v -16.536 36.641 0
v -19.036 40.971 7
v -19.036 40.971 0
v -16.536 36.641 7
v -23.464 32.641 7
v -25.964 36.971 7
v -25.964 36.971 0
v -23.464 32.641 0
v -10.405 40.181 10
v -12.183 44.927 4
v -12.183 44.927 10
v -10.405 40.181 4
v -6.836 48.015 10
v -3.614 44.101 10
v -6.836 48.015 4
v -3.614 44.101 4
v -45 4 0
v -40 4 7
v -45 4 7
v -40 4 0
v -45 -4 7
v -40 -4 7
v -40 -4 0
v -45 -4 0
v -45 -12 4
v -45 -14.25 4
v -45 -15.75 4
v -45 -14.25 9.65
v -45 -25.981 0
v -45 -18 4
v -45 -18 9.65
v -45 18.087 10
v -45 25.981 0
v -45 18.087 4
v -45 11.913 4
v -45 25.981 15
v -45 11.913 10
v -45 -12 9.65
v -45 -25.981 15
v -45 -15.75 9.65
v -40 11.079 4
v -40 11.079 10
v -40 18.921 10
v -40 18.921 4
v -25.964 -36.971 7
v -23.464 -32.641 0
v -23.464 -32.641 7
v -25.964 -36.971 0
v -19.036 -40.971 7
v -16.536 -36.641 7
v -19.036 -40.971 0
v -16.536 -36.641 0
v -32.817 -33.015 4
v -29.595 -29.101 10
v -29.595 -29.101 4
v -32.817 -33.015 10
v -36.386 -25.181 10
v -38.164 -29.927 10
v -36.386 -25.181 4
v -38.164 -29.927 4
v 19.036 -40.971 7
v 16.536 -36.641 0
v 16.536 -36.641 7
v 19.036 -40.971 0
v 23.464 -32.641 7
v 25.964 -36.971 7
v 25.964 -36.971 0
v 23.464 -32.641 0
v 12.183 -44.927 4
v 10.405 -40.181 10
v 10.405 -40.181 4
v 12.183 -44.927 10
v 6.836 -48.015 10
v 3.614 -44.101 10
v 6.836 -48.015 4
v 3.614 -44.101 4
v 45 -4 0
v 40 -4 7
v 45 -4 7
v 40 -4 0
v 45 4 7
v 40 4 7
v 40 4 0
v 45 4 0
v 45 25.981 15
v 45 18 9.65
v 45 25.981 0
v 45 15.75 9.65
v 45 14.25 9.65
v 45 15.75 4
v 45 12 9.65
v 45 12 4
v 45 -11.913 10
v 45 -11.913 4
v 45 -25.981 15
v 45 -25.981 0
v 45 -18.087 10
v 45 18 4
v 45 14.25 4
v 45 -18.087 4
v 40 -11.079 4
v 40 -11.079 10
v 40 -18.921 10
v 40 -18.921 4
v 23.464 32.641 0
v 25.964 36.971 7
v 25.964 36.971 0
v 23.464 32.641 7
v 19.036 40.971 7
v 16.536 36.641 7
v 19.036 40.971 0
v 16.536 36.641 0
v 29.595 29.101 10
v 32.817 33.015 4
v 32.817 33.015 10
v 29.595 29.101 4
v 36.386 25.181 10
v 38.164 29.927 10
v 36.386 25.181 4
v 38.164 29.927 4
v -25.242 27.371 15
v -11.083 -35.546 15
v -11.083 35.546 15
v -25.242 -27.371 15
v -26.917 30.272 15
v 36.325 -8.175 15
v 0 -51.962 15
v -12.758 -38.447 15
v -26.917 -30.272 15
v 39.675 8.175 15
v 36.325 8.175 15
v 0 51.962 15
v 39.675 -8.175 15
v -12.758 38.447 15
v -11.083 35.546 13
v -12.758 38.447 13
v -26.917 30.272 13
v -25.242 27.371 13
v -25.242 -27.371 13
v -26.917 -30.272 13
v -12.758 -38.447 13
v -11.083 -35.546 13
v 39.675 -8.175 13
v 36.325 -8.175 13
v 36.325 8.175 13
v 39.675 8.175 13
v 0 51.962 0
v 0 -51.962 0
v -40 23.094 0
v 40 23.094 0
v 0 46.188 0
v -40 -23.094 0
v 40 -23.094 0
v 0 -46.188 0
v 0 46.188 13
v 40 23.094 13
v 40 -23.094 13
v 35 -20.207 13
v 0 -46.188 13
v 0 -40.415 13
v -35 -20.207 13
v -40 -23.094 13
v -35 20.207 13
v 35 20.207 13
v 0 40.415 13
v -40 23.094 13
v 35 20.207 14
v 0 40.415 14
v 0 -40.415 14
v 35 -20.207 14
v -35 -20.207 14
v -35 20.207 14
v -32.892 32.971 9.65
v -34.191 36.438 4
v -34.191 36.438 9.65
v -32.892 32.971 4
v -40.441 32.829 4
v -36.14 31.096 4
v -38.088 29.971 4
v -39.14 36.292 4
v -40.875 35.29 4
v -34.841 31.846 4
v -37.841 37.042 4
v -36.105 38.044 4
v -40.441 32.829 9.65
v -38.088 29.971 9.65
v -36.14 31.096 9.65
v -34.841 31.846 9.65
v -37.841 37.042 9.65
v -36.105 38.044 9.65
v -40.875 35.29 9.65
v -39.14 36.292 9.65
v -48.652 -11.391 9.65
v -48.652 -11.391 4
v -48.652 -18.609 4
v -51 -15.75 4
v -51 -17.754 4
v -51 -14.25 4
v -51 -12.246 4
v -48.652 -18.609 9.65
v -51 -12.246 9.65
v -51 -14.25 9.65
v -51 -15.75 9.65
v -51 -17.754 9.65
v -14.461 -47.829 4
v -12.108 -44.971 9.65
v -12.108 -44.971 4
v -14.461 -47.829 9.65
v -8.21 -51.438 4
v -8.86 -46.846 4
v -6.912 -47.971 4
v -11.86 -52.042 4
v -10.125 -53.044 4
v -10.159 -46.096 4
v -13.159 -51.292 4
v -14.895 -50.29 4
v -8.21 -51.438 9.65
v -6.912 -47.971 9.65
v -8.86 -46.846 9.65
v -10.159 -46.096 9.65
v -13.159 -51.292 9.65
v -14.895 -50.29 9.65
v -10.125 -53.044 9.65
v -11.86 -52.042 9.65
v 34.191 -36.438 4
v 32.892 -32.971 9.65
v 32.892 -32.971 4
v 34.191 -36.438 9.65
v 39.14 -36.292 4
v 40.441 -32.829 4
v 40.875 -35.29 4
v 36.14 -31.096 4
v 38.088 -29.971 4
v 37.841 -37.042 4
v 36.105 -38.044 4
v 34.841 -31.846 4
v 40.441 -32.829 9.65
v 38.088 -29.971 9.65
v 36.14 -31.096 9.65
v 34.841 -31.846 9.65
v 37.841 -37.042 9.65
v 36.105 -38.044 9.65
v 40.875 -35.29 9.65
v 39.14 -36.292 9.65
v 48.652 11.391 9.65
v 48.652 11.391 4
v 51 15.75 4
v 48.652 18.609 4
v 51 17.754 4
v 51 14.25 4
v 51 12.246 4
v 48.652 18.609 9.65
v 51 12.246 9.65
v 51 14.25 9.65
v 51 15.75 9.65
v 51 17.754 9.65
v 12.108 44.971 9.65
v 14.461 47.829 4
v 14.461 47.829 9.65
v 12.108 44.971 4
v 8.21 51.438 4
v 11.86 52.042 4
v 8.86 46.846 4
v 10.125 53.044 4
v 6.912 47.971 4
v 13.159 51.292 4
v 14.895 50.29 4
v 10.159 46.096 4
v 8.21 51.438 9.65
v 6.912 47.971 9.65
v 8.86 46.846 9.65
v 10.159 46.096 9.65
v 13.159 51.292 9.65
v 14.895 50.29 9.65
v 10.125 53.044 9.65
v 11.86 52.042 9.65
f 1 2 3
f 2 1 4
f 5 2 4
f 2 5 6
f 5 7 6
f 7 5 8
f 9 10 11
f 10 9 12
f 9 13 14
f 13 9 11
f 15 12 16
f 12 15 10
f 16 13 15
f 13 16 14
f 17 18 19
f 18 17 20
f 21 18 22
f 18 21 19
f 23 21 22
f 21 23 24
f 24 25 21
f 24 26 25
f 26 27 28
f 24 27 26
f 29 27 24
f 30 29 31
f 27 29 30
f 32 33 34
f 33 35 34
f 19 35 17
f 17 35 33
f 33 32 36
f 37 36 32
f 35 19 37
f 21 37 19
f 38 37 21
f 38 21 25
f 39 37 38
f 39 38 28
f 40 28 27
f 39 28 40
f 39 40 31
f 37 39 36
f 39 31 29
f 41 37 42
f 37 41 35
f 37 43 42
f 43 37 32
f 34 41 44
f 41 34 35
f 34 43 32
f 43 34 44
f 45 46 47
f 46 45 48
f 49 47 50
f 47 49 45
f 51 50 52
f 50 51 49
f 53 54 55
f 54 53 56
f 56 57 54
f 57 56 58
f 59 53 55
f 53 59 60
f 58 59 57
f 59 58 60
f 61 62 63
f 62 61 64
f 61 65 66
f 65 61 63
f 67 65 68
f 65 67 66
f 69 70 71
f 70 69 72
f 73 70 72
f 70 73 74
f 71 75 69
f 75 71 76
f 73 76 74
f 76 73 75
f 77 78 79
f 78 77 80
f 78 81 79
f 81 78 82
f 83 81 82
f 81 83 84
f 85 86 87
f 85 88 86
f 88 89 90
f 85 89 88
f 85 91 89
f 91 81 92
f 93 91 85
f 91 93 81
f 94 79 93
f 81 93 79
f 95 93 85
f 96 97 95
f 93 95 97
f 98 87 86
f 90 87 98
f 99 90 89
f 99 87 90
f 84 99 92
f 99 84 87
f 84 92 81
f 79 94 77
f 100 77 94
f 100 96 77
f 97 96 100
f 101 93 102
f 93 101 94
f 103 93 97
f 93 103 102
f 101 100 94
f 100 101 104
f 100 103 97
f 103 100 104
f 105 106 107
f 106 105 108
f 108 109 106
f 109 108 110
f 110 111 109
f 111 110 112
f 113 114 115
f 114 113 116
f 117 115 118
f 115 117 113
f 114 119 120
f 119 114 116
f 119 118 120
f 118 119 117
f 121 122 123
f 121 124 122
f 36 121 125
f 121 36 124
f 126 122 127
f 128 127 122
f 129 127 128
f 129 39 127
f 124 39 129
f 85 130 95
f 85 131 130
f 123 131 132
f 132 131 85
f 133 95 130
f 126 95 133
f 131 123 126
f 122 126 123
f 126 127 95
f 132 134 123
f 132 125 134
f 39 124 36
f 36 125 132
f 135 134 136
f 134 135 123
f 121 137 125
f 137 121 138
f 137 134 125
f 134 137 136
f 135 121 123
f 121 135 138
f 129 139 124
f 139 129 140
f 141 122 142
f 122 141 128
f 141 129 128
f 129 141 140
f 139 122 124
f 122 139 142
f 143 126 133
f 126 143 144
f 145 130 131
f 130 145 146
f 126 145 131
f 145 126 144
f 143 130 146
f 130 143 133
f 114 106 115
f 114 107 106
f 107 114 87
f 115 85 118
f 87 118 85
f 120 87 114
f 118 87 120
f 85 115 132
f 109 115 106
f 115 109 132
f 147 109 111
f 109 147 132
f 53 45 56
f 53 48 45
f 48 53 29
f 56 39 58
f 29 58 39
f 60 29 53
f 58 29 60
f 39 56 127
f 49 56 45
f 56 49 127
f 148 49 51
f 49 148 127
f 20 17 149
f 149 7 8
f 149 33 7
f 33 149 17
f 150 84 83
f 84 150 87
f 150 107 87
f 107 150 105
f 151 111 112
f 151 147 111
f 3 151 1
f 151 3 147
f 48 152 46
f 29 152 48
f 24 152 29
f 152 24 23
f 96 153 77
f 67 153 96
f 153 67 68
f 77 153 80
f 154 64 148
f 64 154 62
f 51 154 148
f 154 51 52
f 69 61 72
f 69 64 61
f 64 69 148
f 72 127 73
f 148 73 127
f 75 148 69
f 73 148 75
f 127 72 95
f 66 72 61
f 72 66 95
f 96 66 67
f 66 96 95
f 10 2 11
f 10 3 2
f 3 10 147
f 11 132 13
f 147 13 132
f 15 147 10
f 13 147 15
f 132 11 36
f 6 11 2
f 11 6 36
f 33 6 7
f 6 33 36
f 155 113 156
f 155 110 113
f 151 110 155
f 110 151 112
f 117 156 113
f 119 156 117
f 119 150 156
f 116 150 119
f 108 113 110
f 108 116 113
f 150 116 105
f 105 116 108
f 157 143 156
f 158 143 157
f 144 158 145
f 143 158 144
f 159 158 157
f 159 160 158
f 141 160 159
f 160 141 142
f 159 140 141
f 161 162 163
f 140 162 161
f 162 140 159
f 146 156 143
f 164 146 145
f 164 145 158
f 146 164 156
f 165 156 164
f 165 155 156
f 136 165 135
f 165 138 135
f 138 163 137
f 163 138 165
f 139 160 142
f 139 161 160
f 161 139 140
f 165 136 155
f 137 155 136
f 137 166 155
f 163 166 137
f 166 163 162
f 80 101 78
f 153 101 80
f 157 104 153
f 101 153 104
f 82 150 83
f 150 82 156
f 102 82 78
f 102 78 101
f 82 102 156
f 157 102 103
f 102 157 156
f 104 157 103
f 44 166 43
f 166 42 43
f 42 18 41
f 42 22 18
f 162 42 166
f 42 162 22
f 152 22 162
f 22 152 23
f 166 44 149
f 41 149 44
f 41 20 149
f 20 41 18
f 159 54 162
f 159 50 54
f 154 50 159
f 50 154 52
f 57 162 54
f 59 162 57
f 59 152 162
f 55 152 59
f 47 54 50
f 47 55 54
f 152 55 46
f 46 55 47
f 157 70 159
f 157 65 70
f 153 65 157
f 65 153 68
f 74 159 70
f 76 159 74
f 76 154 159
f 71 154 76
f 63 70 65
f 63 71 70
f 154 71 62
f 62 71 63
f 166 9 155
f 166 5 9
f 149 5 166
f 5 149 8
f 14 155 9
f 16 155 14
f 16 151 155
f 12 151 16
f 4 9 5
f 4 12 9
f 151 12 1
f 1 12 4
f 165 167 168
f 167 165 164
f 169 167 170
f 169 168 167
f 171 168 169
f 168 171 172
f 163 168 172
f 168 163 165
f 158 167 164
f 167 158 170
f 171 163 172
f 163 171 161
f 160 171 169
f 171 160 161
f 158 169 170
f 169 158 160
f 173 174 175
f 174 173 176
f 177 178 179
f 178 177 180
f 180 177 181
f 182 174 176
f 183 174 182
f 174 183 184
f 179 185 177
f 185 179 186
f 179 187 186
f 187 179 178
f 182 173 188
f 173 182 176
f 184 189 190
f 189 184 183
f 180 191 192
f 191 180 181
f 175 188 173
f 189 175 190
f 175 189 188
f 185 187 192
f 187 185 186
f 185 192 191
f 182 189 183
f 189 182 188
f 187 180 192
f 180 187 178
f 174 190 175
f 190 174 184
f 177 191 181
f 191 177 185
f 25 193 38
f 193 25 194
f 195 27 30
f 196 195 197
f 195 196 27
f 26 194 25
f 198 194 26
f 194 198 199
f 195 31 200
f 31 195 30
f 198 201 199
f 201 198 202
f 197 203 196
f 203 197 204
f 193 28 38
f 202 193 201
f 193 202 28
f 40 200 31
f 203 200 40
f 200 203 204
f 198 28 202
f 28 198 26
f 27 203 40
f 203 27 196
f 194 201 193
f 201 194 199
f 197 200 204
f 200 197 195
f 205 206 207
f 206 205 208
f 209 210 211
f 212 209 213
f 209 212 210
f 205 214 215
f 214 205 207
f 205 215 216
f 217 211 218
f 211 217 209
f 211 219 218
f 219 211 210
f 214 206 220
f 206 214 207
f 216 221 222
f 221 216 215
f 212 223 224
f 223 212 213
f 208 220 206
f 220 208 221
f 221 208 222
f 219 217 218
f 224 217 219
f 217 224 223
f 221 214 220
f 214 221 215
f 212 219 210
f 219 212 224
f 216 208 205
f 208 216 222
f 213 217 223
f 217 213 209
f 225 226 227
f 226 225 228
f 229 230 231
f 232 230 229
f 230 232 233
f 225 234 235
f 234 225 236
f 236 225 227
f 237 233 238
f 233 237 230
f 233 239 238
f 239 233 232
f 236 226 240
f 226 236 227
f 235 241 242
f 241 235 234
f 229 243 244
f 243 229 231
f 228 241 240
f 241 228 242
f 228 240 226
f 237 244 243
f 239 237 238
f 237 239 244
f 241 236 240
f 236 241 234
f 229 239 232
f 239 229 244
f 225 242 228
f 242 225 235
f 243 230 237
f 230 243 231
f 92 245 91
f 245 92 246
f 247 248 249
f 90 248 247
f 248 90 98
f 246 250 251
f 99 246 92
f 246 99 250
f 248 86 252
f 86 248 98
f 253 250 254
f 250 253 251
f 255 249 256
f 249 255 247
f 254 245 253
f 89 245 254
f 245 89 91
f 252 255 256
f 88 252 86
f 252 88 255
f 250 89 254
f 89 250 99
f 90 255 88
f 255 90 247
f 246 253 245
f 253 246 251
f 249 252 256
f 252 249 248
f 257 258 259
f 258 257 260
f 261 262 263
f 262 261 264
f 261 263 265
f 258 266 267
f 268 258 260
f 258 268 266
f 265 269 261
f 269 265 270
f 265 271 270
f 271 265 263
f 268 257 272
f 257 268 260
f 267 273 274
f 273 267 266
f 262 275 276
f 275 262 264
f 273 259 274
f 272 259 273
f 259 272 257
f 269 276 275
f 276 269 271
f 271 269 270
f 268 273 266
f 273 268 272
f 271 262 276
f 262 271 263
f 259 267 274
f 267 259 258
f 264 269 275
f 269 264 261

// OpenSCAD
mode=1;

tolerance=.175;

module hexagon(r){
    polygon(points=[
                [r,(r*(tan(30)))],
                [0,(r*(2/sqrt(3)))],
                [-r,(r*(tan(30)))],
                [-r,-(r*(tan(30)))],
                [0,-(r*(2/sqrt(3)))], 
                [r,-(r*(tan(30)))]
    ]);     
}
 
// Repeat something on each side
module hexagon_each(r, offset=30) {
    for (a = [0:60:359]) {
        rotate([0, 0, a+offset]) {
            translate([0, r, 0]) {
                children();
            }
        }
    }
}

// Repeat something in 3 positions
module tri_each(r, offset=30) {
    for (a = [0:120:359]) {
        rotate([0, 0, a+offset]) {
            translate([0, r, 0]) {
                children();
            }
        }
    }
}

// Dovetail joint element
module dovetail(width1=8, width2=10, length=8, height=10) {
    linear_extrude(height=height) {
        polygon(points=[
            [-width1/2, -length/2],
            [width1/2, -length/2],
            [width2/2, length/2],
            [-width2/2, length/2],
        ]);
    }
}

module tile(height, diameter, lens_height=1, plate_size=80) {
   tab_height = 4;
   union() {
       difference() {
         // Main body
         linear_extrude(height=height) {
             hexagon(diameter/2);
         }
         linear_extrude(height=height-lens_height*2) {
             hexagon(diameter/2-5);
         }
         linear_extrude(height=height-lens_height) {
             hexagon(diameter/2-10);
         }
         hexagon_each(diameter/2) {
             // Cable holes
             translate([0, -3, 3])
                cube([8, 6, 8], center=true);
             // Tab holes
             translate([diameter/6, -3, tab_height])
                dovetail(width1=8+tolerance, width2=6+tolerance, length=6, height=6);
         }
         translate([0, 0, height/2])
         tri_each(plate_size/2*.95) {
            cube([plate_size*.2+tolerance*2, 3+tolerance*2, height], center=true);
         }
       }
       // tabs that stick out
       hexagon_each(diameter/2) {
           translate([-diameter/6, 3, tab_height])
             difference() {
                 dovetail(width1=6, width2=8, length=6, height=6-tolerance*2);
                 translate([0, 0, 3])
                     cube([1.5, 6, 6], center=true);
                 translate([4, 2.5, 3])
                 rotate([0, 0, 20])
                     cube([2, 6, 6], center=true);
                 translate([-4, 2.5, 3])
                 rotate([0, 0, -20])
                     cube([2, 6, 6], center=true);
             }
       }
   }
}

module front_plate(diameter, clip_height=8, thickness=2) {
    union() {
        linear_extrude(height=thickness) {
            union() {
                difference() {
                    hexagon(diameter/2);
                    hexagon(diameter/2*.8);
                }
                difference() {
                    hexagon(diameter/2*.45);
                    hexagon(diameter/2*.25);
                }
                tri_each(diameter*.35) {
                    square([diameter*.08, diameter/4], center=true);
                }
            }
        }
        clip_size=3;
        translate([0, 0, -thickness])
        tri_each(diameter/2*.95) {
            translate([(diameter*.2-clip_size)/2, 0, 0])
                cube([clip_size, clip_size, clip_height*2/3], center=true);
            translate([-(diameter*.2-clip_size)/2, 0, 0])
                cube([clip_size, clip_size, clip_height*2/3], center=true);
            translate([0, 0, -clip_height/2])
                cube([diameter*.2, clip_size, clip_height/3], center=true);
        }
    }
}

if (mode == 0) {
    tile(15, 90, plate_size=80);
    // Just for display
    translate([0, 0, 30]) color("green")
        front_plate(80);
} else if (mode == 1) {
    tile(15, 90, plate_size=80);
} else if (mode == 2) {
    front_plate(80);
} else if (mode == 3) {
    intersection(){
        tile(15, 90, plate_size=80);
        translate([45,0,10])
        cube([20,60,20], center=true);
    }
}
